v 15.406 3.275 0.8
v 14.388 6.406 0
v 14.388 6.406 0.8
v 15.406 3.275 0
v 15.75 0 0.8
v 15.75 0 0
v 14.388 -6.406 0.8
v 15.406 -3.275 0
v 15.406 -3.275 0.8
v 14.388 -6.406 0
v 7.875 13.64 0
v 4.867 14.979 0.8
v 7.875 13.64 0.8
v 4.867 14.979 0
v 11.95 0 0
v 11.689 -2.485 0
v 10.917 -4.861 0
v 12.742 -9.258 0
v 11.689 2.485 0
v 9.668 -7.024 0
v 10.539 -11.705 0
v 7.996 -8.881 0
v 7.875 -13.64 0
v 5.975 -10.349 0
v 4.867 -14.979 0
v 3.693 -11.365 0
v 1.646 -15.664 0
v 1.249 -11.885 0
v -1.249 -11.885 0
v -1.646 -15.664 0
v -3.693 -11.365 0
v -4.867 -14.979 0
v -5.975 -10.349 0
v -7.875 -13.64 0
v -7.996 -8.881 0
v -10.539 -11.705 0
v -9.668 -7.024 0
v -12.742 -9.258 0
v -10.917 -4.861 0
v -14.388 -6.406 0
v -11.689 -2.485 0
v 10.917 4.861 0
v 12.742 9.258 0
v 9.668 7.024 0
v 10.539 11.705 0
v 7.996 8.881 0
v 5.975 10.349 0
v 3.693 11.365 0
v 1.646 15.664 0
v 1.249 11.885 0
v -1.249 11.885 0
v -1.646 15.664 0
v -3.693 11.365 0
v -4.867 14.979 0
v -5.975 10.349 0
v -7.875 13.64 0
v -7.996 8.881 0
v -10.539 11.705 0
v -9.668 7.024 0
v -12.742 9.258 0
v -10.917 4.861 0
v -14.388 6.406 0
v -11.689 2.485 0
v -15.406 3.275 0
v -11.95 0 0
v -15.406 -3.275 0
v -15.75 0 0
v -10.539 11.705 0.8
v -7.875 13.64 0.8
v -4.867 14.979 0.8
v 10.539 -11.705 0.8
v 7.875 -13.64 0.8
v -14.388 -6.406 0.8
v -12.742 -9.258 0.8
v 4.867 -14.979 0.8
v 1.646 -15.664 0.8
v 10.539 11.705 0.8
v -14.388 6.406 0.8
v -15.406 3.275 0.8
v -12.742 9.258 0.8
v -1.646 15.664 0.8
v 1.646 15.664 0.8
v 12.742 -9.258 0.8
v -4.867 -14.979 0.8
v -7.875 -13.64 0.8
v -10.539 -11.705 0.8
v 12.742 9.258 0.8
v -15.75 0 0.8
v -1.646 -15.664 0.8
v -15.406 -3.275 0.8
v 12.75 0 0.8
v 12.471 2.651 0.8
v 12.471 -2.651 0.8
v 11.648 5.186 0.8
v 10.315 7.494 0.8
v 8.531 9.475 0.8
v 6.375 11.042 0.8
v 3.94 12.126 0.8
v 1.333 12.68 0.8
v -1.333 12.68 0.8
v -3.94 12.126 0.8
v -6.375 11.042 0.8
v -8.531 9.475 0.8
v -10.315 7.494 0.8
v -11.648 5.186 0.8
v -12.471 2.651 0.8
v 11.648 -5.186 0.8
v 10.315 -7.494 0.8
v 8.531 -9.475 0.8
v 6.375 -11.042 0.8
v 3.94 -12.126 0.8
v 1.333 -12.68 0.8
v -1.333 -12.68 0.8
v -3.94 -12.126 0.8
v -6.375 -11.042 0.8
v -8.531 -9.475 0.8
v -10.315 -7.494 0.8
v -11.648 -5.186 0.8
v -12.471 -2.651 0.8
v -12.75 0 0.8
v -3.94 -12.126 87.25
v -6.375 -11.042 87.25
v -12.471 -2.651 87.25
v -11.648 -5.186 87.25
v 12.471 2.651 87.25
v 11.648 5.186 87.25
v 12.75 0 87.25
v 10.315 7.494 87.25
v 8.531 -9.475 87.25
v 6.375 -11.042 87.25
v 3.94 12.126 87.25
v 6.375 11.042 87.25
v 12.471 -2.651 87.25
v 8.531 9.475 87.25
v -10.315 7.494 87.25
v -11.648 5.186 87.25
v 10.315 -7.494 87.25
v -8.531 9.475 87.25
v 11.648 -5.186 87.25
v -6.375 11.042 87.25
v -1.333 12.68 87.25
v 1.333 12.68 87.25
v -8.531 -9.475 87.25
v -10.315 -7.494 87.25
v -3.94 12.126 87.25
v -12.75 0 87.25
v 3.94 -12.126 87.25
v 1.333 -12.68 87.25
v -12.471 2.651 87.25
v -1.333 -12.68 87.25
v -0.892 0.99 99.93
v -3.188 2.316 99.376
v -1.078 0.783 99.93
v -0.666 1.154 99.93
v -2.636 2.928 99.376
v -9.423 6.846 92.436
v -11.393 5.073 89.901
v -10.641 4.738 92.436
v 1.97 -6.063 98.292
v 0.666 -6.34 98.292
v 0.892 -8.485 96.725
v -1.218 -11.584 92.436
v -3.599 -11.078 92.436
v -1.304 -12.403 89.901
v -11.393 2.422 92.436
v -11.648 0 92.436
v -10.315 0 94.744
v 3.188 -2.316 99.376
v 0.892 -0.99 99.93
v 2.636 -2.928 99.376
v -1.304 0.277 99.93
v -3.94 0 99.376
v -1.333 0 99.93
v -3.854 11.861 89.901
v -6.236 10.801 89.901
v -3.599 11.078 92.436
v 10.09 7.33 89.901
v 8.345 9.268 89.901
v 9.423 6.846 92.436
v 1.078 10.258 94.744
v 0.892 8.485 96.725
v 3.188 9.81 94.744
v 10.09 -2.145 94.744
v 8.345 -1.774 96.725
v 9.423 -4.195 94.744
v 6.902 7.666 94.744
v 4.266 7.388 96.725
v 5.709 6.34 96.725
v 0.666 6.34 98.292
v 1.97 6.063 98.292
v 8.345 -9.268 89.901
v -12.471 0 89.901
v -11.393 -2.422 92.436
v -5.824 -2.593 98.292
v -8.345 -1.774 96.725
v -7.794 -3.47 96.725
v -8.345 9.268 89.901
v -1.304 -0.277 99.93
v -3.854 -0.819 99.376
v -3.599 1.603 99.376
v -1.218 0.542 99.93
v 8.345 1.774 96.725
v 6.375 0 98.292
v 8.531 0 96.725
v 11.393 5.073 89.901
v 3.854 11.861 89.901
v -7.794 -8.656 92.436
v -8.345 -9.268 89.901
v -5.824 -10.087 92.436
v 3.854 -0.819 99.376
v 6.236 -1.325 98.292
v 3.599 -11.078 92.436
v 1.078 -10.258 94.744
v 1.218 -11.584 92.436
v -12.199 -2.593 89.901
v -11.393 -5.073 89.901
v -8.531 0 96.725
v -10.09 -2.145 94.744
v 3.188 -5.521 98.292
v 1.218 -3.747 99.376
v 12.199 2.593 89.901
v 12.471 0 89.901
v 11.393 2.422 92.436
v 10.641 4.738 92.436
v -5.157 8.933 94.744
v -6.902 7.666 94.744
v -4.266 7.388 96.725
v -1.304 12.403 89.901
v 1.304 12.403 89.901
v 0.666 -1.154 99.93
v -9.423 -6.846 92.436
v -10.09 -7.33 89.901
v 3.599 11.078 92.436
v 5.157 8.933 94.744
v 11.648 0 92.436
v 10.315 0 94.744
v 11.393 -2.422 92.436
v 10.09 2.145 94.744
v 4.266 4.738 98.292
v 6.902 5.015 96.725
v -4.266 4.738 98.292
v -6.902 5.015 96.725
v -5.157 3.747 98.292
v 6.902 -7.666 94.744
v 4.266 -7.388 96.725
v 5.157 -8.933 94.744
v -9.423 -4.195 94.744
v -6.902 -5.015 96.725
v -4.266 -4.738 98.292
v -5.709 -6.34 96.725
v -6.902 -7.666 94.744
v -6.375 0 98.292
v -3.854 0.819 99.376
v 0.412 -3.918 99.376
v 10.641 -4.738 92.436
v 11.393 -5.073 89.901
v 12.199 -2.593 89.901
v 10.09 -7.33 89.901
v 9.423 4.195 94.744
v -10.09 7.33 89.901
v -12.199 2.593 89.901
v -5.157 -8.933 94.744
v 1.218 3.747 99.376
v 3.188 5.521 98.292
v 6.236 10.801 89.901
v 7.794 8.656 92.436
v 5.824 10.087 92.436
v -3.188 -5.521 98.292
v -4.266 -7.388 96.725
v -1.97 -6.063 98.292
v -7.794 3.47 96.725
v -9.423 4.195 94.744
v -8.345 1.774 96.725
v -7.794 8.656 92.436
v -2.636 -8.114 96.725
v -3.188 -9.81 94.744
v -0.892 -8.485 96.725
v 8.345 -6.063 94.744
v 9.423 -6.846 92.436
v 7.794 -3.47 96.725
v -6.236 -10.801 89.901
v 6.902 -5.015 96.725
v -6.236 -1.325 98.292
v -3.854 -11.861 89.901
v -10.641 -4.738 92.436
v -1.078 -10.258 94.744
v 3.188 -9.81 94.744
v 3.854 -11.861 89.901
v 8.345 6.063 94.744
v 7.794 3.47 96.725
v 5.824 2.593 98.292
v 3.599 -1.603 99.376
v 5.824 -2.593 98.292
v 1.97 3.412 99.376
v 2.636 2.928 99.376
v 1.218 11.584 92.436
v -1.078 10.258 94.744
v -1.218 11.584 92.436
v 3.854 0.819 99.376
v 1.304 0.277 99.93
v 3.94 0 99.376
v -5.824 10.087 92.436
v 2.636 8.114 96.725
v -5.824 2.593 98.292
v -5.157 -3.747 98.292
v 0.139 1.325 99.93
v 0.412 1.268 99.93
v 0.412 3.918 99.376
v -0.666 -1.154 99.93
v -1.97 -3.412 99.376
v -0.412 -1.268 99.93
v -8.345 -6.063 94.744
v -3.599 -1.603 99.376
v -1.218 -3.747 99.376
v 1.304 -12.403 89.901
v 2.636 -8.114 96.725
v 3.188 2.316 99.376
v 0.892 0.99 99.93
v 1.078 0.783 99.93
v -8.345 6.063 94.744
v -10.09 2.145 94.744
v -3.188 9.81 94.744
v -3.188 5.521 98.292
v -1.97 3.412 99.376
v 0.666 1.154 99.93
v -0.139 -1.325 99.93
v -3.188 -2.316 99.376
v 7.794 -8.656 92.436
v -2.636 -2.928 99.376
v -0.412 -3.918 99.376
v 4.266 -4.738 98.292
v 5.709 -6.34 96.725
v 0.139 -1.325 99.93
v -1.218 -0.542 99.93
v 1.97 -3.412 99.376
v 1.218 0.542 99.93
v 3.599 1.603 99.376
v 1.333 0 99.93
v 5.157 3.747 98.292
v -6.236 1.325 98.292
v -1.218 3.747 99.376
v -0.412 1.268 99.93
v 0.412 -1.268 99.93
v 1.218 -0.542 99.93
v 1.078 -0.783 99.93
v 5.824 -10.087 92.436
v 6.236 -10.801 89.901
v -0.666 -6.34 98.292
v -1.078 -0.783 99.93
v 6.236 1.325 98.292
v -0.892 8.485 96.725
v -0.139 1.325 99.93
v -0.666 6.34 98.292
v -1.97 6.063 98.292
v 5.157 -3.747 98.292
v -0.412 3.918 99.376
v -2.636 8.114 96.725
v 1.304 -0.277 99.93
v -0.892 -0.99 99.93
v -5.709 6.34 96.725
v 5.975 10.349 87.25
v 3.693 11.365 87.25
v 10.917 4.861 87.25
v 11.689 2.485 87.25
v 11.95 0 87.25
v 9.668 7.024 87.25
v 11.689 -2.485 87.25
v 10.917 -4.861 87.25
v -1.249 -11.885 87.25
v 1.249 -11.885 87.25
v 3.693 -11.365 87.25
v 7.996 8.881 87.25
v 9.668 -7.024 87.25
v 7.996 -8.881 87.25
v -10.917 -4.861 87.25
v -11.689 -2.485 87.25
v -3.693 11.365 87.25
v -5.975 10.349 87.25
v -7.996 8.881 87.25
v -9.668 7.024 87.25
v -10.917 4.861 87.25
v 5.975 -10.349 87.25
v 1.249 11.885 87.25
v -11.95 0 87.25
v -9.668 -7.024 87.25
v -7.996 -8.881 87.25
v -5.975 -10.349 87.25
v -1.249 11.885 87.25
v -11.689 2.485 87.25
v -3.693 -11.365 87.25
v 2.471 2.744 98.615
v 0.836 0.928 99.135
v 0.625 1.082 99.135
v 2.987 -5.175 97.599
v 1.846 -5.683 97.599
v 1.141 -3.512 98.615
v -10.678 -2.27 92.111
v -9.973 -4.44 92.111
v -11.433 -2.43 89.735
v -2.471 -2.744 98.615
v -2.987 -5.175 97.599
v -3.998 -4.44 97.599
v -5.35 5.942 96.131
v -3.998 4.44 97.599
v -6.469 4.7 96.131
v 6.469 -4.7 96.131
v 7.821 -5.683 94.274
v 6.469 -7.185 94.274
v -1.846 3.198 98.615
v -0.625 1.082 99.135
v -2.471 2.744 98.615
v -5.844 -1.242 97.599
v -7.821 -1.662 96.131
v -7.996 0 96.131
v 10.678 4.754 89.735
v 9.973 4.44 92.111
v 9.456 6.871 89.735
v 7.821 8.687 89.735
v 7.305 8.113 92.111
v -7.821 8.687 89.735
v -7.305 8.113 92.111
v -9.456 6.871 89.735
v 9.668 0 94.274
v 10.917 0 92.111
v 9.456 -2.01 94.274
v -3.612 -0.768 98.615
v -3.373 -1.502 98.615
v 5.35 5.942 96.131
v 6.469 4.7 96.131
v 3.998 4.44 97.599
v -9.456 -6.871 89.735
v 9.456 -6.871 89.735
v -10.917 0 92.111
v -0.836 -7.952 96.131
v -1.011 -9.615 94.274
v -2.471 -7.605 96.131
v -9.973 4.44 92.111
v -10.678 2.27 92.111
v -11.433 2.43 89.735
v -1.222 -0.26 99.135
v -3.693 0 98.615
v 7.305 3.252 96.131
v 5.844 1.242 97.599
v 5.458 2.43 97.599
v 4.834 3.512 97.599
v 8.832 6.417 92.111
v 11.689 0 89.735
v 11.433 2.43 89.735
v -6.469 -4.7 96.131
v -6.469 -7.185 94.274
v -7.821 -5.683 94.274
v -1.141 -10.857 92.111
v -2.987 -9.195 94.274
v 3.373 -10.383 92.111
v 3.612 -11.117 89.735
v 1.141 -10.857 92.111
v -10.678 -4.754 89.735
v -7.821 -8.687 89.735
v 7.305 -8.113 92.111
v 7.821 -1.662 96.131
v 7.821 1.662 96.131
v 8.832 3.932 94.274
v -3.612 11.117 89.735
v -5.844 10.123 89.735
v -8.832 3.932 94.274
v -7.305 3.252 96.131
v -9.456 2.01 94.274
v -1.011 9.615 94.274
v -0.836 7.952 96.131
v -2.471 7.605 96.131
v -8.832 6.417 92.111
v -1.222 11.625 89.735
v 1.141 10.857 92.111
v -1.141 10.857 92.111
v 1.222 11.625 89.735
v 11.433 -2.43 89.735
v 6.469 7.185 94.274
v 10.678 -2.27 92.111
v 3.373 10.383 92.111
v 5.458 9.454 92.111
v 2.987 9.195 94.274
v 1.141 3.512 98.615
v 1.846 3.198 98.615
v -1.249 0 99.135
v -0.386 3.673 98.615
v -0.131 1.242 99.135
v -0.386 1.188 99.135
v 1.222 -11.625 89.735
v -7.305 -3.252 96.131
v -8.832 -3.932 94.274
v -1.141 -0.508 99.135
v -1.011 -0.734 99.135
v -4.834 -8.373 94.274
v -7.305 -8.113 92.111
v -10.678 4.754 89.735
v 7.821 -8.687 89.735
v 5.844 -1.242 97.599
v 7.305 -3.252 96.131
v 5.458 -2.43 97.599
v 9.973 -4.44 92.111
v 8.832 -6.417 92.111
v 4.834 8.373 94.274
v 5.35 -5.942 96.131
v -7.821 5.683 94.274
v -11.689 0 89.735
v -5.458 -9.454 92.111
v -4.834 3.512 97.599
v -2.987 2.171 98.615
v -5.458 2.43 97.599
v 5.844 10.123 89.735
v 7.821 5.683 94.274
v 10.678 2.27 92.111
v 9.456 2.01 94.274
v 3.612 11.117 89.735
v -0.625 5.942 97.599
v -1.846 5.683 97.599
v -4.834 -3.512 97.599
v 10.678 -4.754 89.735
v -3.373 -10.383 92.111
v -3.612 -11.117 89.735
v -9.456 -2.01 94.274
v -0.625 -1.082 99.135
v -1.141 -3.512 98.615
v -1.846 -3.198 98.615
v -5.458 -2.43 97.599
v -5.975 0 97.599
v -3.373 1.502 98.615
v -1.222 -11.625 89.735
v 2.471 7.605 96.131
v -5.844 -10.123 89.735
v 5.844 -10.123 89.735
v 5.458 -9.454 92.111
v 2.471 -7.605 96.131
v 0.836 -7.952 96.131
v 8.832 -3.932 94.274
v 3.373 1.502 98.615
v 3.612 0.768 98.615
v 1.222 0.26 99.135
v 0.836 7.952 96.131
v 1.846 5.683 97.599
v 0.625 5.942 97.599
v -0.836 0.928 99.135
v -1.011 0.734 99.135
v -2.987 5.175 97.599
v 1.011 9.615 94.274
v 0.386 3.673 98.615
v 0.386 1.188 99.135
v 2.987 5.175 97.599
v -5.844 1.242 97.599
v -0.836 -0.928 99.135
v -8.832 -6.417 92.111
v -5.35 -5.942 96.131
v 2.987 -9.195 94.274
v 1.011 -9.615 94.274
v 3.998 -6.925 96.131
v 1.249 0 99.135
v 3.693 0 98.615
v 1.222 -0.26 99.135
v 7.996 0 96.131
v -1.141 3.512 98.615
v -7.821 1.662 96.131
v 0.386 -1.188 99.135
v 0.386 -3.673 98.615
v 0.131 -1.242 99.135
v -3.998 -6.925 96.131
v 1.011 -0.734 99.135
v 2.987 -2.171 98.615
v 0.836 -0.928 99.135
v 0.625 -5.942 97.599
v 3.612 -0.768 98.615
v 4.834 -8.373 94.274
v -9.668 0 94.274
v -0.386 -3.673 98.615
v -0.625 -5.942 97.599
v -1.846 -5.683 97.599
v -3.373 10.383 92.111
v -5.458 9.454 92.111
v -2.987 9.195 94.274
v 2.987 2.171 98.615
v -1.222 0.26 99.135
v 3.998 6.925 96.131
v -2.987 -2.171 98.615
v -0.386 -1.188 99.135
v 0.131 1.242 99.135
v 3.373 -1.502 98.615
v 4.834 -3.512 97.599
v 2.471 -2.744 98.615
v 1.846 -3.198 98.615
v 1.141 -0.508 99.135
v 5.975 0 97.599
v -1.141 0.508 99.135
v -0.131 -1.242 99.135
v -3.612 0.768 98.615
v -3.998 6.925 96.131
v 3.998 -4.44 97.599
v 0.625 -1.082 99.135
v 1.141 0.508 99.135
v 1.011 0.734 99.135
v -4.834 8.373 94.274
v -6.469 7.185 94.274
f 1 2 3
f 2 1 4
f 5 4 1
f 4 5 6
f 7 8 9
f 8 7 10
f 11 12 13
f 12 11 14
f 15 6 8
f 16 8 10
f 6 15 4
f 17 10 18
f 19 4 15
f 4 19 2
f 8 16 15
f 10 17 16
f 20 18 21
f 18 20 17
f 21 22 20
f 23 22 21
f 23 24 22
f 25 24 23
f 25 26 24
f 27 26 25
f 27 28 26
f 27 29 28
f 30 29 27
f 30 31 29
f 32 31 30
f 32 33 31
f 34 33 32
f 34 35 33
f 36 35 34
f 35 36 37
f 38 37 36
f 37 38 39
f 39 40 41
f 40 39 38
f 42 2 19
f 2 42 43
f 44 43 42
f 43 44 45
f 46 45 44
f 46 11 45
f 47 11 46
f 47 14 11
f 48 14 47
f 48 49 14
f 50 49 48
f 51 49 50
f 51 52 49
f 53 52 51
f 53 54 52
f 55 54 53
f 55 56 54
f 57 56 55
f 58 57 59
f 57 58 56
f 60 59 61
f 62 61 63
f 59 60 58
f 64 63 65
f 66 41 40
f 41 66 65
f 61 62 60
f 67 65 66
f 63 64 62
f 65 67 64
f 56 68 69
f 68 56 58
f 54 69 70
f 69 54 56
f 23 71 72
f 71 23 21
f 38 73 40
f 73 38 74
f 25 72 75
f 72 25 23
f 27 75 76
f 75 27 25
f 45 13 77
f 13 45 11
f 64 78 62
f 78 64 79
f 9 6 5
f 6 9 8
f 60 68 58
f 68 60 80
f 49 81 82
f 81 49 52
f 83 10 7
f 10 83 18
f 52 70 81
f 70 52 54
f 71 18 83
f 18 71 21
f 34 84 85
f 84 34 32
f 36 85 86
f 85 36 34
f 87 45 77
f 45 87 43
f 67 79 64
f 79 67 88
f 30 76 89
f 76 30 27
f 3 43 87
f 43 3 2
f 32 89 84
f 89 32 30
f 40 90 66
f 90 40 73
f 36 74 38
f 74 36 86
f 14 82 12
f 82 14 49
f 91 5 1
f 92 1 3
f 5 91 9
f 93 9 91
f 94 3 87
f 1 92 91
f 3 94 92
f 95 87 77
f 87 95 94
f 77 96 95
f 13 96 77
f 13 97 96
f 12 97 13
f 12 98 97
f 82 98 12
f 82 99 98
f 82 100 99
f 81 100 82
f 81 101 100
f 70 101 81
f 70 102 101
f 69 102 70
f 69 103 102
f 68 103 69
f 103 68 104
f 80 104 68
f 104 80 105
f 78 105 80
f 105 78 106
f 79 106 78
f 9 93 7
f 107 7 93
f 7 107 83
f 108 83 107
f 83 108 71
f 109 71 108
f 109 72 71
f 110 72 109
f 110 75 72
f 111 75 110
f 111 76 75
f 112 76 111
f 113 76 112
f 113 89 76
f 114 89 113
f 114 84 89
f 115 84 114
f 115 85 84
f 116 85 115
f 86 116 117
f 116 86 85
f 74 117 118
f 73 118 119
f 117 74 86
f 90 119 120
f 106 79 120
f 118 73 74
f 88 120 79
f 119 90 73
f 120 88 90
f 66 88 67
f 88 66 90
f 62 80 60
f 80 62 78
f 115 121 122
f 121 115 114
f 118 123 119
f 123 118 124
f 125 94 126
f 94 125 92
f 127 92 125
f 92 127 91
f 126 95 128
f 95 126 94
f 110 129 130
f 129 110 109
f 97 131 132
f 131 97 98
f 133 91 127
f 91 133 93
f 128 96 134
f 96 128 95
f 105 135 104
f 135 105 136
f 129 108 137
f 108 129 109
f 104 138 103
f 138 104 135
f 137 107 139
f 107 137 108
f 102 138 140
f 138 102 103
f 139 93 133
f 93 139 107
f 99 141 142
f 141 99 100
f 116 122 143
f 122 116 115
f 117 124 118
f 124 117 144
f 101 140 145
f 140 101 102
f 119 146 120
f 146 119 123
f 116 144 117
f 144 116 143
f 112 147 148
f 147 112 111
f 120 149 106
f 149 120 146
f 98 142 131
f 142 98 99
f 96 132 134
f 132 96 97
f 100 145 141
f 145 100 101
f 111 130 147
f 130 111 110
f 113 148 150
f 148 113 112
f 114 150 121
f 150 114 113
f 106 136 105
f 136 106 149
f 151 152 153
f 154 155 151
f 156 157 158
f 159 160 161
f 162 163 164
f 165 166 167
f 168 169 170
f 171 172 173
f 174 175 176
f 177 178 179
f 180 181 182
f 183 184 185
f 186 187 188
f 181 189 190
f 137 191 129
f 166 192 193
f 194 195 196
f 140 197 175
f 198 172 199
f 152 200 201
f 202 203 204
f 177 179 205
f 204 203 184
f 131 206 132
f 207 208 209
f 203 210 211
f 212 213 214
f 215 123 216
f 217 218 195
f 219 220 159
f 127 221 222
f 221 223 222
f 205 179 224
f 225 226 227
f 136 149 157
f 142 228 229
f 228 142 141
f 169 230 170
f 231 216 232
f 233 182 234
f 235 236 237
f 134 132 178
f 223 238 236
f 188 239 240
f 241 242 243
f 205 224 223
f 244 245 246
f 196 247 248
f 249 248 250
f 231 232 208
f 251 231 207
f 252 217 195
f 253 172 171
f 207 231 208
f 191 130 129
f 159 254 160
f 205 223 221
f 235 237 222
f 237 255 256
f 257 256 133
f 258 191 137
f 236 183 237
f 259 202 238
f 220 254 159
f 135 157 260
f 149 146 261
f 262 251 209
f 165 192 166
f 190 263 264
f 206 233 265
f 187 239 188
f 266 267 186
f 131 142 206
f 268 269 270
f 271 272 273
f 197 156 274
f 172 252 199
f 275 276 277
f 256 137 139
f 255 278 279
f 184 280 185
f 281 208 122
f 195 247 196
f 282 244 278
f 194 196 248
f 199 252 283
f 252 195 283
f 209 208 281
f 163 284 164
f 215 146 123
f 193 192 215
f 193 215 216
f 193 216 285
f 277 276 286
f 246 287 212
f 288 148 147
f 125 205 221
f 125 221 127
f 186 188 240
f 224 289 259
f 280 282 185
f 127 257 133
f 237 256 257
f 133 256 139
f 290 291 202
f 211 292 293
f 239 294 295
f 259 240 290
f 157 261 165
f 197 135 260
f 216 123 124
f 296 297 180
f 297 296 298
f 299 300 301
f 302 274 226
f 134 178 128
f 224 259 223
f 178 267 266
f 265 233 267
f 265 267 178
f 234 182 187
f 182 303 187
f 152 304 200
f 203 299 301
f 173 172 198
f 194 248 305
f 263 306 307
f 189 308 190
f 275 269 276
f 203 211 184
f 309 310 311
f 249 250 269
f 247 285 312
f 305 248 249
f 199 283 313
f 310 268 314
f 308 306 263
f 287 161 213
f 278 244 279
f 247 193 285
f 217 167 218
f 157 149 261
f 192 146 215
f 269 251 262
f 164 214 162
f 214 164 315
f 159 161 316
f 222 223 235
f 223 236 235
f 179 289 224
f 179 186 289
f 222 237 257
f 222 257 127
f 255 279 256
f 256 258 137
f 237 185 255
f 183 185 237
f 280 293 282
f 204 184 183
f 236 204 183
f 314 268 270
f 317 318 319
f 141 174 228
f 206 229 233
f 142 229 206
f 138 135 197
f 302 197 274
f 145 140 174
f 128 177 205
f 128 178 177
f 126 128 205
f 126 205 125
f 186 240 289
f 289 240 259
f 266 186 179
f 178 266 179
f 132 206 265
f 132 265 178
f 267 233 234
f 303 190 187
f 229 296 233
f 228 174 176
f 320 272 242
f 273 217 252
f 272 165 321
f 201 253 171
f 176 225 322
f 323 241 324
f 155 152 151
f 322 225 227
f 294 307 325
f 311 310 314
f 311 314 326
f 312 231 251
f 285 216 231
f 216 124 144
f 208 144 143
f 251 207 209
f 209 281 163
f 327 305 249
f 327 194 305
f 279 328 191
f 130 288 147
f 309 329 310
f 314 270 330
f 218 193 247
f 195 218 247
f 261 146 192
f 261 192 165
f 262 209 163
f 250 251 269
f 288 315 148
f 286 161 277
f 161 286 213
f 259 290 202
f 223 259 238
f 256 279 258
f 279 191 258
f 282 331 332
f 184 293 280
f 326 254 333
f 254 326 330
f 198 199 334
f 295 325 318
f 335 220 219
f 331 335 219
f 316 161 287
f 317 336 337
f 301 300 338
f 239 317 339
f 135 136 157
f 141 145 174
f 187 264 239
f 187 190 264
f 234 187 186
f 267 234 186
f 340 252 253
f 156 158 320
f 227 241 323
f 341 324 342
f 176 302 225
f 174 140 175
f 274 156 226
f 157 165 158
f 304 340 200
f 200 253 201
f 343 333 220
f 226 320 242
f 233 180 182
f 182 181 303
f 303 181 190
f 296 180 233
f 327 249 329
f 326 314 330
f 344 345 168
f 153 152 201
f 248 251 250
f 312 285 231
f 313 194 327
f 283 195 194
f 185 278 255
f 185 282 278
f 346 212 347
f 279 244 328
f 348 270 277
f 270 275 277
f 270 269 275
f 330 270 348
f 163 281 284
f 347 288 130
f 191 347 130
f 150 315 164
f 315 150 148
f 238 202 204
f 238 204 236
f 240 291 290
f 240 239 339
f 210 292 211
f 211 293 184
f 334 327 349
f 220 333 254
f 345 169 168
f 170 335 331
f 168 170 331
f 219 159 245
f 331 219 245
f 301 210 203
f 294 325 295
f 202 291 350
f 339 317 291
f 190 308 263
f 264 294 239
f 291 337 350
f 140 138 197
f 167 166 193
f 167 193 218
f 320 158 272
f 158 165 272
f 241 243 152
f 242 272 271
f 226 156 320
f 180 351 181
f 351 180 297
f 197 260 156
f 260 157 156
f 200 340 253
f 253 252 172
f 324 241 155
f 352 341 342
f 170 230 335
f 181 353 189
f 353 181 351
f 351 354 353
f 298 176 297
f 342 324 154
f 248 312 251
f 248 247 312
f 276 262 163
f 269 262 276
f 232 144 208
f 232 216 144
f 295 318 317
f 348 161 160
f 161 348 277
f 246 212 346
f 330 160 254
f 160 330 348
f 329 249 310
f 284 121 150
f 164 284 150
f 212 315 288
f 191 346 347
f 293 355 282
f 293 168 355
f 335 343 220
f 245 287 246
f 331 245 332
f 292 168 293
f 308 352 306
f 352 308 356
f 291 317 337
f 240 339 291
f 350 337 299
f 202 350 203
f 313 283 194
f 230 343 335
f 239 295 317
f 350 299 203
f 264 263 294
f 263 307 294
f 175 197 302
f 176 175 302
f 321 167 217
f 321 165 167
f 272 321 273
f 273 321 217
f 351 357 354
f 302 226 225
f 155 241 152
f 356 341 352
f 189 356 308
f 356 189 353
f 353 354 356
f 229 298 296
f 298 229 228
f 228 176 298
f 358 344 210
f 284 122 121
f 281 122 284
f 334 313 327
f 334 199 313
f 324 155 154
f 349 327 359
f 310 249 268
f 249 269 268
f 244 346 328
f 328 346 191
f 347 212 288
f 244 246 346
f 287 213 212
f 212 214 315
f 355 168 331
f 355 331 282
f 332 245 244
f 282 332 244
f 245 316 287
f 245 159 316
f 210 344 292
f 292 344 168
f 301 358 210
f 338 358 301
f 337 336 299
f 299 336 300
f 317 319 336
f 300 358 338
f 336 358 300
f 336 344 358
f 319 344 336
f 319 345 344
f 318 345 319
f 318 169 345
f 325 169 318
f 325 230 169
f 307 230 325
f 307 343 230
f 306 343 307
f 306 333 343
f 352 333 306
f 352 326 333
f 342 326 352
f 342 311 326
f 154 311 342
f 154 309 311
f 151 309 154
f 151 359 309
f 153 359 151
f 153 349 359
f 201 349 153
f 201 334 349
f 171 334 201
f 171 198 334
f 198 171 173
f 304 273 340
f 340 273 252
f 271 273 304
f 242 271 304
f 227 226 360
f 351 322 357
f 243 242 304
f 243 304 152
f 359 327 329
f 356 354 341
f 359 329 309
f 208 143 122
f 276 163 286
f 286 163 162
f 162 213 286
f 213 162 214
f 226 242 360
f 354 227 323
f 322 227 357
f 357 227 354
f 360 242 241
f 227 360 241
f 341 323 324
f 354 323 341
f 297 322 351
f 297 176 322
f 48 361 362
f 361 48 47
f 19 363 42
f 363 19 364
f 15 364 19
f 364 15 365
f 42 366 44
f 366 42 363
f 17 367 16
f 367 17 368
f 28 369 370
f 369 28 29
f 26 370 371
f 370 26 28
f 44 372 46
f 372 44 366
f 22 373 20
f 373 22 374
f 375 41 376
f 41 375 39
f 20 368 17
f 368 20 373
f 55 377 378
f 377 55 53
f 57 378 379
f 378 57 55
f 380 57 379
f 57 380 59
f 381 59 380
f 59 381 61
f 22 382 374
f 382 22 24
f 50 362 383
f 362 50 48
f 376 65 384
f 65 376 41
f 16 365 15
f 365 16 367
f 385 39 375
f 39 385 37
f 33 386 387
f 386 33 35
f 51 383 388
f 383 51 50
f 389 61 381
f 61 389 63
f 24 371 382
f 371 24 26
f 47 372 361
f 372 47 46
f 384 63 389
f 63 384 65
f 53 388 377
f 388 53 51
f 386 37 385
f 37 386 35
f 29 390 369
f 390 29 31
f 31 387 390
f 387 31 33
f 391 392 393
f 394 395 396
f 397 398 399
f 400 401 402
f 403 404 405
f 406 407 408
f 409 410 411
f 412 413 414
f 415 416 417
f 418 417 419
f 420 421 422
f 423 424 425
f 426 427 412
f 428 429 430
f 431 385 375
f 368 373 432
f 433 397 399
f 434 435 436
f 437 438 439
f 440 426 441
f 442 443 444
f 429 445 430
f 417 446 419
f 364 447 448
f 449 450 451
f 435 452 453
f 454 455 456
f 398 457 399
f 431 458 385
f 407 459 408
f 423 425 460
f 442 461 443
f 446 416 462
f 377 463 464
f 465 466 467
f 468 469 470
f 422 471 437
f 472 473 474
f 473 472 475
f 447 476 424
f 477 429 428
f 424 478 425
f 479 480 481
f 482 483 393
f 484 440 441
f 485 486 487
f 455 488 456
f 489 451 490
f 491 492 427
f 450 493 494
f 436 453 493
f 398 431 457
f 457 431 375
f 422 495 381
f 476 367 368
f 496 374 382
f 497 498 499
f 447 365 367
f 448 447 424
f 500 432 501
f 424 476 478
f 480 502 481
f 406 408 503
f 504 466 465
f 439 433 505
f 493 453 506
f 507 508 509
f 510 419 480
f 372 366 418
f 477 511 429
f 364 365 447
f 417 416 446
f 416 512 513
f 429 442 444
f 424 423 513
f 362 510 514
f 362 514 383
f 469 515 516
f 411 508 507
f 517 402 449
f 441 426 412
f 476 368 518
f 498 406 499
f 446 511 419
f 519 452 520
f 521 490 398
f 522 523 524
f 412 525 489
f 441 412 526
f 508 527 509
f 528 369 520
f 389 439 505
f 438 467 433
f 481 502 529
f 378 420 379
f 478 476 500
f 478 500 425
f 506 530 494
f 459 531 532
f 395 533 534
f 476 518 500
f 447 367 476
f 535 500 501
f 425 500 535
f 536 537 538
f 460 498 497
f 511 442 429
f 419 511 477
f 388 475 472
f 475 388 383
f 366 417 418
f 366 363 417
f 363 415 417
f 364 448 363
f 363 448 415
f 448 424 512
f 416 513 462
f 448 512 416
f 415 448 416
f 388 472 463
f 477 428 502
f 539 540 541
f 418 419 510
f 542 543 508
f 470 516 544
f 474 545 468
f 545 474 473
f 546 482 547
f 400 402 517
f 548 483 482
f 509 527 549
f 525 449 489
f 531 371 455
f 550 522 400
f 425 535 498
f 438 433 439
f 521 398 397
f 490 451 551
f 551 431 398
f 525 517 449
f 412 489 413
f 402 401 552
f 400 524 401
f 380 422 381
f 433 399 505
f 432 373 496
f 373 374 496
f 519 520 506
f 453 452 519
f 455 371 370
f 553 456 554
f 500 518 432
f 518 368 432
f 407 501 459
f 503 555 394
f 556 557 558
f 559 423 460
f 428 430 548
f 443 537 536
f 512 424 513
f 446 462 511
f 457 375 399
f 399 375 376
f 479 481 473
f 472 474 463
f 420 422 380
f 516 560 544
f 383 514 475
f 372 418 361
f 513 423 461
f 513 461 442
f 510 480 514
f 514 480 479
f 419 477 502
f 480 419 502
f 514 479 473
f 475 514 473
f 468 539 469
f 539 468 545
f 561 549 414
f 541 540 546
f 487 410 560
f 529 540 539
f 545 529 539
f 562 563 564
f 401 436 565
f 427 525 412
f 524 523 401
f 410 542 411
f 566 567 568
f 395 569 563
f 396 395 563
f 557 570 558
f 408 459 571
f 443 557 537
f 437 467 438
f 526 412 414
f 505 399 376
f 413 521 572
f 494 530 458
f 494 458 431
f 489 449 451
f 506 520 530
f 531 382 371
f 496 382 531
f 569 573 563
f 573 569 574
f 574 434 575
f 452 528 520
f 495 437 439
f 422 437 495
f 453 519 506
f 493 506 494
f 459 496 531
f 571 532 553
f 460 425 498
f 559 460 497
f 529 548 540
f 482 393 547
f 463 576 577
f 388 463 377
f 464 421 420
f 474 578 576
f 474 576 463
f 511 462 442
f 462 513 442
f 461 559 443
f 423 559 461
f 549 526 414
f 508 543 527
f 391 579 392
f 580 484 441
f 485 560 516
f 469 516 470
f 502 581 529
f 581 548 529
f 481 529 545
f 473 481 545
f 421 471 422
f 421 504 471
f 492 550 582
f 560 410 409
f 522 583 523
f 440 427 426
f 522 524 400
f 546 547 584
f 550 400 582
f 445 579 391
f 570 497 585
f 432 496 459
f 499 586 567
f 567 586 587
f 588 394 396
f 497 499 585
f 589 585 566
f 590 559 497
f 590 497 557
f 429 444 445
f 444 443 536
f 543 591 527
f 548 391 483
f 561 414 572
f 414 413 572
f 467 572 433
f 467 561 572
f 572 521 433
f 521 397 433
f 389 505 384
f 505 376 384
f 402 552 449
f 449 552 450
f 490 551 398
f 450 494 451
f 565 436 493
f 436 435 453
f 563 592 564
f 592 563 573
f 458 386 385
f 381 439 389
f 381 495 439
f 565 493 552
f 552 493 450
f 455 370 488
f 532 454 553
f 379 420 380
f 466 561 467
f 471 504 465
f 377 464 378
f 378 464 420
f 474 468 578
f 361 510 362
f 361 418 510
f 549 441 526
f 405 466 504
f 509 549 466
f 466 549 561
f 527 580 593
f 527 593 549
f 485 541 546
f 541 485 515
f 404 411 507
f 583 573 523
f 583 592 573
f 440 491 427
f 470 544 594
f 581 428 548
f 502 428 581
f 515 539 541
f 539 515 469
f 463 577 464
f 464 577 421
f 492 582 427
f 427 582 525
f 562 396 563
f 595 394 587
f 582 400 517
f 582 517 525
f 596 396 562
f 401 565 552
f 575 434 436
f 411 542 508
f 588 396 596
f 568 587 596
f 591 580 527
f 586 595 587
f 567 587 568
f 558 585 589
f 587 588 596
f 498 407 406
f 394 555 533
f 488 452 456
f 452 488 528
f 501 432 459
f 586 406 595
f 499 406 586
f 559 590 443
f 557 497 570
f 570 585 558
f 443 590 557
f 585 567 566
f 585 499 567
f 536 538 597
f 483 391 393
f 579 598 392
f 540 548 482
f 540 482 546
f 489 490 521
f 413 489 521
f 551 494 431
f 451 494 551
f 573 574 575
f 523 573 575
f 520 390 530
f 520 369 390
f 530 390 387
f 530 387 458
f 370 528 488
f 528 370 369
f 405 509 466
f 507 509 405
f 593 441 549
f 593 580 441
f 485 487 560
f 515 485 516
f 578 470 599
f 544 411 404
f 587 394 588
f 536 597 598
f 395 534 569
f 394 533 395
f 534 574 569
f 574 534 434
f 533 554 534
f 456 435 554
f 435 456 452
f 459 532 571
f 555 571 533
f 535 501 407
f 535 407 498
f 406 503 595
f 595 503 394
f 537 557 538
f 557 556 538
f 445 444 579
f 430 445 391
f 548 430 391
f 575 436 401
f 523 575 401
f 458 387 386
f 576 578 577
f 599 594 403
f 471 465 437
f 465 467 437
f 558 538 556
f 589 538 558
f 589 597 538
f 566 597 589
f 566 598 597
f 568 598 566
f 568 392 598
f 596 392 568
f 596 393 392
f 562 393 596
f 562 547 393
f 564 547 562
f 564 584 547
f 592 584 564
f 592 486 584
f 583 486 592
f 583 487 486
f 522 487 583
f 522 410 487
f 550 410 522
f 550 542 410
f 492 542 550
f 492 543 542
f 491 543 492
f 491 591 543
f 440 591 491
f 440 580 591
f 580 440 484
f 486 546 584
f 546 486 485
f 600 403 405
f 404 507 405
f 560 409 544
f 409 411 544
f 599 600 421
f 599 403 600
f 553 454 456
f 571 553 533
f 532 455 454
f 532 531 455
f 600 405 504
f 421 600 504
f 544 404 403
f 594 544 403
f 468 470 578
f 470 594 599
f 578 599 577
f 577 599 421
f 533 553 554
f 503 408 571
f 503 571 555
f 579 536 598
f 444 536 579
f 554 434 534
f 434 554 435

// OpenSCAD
/*[Dimensioni globali]*/
//Diametro esterno tubo
dia=25.5;
//Altezzo totale
h=100;

/*[Spessori]*/
//Spessore allargamento
sp1=0.8; //[0.8,1.6,2.4]
//Spessore pareti
sp2=0.8; //[0.2:0.2:1]
//Allargamento all'appoggio
t=6; // [2:minimo, 6:medio, 10:abbondante]


difference(){
    union(){
cylinder(sp1,d1=dia+t,d2=dia+t);
cylinder(h-dia/2,d1=dia,d2=dia);
translate([0,0,h-dia/2])sphere(dia/2);
    }
cylinder(h-dia/2,d1=dia-sp2*2,d2=dia-sp2*2);
translate([0,0,h-dia/2])sphere((dia-sp2*2)/2);
}
